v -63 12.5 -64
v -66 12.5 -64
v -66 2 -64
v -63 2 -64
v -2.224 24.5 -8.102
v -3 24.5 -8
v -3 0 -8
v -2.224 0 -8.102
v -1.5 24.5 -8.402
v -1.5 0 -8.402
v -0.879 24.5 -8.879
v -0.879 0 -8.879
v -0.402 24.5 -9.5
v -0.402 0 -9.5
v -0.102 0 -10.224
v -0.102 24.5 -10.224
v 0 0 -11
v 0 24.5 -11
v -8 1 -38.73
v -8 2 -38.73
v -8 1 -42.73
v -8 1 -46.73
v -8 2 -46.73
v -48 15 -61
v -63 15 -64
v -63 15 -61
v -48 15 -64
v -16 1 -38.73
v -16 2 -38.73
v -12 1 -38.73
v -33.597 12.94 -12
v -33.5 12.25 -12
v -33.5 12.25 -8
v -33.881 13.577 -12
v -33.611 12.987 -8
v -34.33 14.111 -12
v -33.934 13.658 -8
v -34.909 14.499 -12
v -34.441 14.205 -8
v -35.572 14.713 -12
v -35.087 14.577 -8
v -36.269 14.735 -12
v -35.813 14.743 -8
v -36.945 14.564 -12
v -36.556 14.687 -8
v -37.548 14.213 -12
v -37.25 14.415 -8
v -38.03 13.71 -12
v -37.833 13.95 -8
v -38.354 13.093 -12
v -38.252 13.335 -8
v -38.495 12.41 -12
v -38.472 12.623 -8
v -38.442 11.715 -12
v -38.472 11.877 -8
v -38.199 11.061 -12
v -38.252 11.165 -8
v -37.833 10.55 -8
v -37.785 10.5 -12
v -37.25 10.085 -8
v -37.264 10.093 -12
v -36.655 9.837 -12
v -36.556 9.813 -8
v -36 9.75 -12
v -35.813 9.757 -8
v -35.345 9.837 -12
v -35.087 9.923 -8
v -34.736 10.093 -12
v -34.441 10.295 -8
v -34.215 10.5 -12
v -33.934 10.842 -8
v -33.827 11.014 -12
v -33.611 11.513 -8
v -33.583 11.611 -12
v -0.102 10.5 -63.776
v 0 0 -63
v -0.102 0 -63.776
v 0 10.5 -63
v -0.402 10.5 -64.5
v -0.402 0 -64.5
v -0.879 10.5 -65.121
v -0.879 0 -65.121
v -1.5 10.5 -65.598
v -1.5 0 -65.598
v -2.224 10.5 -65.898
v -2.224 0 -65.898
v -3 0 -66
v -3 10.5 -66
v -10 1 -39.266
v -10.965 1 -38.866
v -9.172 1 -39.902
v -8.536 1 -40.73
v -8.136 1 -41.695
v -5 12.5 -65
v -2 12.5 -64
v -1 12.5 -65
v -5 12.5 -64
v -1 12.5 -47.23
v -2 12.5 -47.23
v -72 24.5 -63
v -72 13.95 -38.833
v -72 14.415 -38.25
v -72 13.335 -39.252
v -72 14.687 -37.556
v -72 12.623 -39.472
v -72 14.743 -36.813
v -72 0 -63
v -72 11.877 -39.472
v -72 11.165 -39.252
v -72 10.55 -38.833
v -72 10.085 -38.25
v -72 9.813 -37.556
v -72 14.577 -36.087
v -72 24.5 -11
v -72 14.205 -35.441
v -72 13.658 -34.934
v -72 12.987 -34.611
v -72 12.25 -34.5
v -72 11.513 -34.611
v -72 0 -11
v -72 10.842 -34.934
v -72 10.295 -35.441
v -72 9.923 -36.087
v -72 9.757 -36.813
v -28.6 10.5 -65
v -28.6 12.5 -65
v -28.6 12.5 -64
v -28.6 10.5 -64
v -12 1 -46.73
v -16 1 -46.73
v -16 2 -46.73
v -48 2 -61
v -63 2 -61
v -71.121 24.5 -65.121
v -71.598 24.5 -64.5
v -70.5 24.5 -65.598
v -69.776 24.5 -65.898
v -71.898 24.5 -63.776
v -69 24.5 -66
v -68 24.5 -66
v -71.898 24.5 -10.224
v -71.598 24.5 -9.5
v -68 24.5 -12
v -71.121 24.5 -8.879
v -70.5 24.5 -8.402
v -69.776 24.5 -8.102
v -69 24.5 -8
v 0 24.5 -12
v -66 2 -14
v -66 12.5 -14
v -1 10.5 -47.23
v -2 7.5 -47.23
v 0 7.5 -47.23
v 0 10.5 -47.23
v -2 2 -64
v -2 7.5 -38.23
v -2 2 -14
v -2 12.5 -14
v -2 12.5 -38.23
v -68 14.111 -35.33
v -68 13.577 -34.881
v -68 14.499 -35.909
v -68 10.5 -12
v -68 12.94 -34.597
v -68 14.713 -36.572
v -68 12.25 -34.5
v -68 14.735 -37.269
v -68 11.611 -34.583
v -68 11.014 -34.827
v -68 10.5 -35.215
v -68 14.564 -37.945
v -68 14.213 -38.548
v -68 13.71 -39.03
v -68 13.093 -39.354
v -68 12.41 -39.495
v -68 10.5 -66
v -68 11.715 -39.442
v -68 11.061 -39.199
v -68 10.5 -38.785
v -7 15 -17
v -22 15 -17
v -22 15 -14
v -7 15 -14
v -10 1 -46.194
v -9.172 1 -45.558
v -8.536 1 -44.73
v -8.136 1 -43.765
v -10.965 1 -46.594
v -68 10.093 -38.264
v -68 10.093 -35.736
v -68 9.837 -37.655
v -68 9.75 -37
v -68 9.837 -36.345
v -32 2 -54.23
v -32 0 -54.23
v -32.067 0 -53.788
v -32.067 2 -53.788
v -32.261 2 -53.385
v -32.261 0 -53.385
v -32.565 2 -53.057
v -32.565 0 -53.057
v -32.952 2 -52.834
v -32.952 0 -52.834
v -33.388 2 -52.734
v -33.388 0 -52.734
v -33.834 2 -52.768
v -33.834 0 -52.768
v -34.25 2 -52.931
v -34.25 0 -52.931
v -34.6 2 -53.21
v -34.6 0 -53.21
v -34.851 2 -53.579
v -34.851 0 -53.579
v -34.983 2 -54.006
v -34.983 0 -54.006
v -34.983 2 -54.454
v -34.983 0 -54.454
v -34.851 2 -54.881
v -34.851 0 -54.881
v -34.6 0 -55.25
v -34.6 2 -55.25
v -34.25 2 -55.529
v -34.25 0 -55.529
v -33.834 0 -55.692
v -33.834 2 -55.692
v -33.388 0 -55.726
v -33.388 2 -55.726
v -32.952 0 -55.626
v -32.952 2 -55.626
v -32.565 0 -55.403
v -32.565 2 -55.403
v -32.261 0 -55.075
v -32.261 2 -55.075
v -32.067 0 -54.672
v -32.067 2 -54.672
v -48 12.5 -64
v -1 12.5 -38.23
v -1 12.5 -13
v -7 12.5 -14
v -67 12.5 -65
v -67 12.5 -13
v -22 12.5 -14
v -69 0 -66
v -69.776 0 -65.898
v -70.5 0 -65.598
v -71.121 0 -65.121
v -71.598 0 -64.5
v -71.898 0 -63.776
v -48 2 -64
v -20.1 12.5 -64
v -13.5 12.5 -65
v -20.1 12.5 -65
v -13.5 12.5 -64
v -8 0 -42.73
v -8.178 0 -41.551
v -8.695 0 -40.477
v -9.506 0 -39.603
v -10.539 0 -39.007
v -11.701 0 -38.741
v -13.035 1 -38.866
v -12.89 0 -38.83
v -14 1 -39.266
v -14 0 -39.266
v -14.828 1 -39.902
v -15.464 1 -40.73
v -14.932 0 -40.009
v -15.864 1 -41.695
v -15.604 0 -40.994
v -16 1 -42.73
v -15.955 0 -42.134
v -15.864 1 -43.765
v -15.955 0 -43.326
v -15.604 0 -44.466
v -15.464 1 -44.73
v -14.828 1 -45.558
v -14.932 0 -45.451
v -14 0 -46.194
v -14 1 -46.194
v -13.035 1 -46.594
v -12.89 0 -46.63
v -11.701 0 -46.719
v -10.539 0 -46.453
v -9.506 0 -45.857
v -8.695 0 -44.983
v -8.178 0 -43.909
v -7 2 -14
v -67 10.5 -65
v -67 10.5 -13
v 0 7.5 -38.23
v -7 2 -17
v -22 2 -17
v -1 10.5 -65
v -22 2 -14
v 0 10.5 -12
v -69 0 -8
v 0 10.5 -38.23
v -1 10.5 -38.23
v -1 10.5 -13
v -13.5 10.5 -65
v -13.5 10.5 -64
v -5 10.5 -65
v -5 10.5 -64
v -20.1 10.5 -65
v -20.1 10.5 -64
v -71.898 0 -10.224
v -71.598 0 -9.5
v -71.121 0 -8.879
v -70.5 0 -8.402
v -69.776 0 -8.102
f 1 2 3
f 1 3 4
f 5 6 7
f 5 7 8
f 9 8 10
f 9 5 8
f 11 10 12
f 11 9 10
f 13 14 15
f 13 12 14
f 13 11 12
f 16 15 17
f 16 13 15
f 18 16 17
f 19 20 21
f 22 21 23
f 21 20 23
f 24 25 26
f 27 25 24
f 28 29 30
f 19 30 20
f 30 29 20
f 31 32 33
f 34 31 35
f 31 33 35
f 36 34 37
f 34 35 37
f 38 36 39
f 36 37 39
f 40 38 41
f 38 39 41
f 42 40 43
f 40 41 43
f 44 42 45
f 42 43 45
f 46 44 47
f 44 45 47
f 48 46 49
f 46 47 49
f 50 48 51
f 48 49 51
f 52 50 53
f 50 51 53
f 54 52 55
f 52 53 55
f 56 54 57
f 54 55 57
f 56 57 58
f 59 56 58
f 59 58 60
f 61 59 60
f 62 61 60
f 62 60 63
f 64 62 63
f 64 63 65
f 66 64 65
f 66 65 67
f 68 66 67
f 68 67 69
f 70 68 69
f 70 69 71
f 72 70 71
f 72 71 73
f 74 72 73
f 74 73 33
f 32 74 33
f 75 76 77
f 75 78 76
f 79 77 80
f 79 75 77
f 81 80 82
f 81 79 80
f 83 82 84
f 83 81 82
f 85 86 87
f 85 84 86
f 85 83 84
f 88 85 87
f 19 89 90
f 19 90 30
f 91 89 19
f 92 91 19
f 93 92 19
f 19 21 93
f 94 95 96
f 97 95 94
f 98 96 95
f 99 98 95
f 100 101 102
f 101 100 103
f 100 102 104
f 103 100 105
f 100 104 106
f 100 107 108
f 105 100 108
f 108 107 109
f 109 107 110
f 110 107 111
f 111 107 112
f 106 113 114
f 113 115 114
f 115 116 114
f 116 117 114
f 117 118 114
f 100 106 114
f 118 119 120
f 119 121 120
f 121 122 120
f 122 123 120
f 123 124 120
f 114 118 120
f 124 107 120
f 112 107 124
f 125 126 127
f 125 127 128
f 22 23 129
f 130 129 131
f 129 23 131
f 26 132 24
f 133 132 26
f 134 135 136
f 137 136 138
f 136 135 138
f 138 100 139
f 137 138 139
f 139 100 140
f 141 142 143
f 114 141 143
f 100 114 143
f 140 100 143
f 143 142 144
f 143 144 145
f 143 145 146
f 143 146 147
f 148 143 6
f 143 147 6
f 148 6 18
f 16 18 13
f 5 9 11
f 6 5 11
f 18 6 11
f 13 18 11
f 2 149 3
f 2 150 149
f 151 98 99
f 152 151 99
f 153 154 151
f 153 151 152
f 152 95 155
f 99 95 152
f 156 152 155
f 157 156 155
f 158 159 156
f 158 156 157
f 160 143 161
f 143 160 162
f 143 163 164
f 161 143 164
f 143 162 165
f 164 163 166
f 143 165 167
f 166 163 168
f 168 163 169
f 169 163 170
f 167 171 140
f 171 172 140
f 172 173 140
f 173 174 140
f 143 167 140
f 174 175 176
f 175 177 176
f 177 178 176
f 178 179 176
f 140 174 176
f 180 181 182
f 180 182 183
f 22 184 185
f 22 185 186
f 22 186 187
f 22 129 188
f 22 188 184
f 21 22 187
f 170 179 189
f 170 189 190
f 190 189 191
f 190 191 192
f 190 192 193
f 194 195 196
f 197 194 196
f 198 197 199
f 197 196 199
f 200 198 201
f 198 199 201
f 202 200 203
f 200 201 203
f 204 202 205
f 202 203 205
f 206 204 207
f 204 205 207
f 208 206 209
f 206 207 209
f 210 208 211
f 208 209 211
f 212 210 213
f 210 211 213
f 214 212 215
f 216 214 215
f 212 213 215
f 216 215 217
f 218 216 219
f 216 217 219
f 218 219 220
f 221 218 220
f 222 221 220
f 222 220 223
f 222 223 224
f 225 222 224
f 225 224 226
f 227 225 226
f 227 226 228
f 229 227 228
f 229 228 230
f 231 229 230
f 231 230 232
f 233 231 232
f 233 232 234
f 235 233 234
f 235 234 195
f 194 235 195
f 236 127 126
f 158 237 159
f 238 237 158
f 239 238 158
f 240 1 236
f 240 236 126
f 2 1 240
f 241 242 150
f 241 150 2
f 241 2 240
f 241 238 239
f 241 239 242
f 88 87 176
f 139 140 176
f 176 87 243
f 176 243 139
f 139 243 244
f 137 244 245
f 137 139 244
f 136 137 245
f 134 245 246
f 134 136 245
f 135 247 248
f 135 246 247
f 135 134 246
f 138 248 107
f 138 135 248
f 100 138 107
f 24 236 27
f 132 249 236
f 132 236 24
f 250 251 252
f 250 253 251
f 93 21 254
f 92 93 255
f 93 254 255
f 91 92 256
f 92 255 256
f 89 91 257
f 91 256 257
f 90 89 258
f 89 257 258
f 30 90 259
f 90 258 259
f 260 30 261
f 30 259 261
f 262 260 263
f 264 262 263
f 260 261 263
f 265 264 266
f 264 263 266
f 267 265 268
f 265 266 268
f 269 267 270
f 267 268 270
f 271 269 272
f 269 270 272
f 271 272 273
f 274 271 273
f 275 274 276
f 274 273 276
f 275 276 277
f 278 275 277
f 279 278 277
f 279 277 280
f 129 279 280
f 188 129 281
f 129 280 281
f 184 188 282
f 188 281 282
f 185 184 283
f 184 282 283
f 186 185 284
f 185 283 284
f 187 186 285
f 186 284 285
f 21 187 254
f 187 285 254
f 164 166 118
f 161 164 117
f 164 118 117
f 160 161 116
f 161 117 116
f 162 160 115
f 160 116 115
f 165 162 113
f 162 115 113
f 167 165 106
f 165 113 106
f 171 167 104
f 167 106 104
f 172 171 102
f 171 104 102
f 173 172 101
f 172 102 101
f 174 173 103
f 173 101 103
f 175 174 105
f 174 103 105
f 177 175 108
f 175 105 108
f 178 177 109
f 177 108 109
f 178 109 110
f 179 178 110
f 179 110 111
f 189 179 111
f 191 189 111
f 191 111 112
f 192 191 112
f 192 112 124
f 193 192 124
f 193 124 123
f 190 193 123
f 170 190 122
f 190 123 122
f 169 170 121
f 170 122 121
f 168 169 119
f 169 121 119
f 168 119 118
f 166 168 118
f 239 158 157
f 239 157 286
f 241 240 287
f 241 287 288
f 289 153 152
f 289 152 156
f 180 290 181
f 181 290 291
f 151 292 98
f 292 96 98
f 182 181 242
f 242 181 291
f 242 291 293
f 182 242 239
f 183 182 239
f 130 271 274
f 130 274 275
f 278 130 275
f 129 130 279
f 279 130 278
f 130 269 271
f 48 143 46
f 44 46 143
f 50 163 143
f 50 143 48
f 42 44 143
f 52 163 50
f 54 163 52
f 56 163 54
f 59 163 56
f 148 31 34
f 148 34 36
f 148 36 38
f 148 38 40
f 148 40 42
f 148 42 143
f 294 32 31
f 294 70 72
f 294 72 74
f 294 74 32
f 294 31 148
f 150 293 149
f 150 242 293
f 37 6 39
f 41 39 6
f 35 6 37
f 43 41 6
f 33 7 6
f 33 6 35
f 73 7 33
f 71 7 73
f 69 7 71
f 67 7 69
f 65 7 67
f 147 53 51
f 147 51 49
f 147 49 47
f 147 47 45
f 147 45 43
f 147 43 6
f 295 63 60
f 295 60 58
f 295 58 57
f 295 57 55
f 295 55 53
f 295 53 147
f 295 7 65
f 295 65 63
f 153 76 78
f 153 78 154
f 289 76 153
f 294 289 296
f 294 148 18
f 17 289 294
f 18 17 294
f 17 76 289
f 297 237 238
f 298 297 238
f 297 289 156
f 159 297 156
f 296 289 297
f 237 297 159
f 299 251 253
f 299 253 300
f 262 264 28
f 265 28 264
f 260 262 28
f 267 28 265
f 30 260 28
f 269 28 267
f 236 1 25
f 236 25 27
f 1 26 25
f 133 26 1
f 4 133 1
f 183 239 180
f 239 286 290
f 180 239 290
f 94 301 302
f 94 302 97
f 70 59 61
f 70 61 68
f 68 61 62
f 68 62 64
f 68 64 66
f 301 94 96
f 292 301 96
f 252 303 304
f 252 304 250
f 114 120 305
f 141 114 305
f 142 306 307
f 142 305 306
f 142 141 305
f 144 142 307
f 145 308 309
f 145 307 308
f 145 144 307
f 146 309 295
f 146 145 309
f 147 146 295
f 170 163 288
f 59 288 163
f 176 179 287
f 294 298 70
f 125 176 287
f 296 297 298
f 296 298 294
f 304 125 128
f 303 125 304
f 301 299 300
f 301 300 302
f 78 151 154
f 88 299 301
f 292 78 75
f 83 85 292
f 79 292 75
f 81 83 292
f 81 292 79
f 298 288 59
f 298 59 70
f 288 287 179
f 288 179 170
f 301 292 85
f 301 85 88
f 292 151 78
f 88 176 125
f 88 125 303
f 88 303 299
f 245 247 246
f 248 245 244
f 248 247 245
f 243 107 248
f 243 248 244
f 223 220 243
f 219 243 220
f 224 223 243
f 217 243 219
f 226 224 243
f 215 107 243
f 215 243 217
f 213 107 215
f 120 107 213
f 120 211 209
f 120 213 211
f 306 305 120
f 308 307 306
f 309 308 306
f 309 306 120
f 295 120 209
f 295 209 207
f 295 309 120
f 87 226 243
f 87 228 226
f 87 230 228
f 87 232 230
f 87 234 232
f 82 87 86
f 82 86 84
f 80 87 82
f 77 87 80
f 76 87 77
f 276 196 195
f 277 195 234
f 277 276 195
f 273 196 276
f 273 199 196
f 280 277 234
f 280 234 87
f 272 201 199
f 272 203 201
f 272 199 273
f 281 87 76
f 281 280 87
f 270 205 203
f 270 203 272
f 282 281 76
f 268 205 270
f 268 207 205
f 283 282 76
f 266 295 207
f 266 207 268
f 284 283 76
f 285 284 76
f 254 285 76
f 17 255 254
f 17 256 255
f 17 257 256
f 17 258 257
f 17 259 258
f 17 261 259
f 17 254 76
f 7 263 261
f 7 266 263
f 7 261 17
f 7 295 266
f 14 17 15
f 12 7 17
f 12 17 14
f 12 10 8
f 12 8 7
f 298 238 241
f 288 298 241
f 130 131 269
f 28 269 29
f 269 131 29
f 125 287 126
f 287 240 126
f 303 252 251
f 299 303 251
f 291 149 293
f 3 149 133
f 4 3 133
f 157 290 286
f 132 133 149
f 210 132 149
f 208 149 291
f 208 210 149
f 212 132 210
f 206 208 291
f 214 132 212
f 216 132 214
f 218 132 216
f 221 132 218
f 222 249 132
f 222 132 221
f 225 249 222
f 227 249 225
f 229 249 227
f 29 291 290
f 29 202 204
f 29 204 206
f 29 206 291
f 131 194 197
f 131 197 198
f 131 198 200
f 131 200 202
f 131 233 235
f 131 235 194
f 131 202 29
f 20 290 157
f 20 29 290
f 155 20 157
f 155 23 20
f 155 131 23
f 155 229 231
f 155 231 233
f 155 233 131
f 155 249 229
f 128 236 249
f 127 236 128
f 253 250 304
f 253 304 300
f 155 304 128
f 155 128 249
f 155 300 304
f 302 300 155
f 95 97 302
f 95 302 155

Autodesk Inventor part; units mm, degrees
ref_plane "YZ Plane" through (0, 0, 0) normal (1, 0, 0) x (0, 1, 0)
ref_plane "XZ Plane" through (0, 0, 0) normal (0, 1, 0) x (-1, 0, 0)
ref_plane "XY Plane" through (0, 0, 0) normal (0, 0, 1) x (1, 0, 0)
sketch "Sketch1" plane through (0, 0, 0) normal (0, 1, 0) x (-1, 0, 0)
  point P0 (0, 0)
sketch "Sketch2" plane through (0, 0, 0) normal (0, 1, 0) x (-1, 0, 0)
  line L0 (68, -12) -> (68, -66)
  line L1 (68, -66) -> (0, -66)
  line L2 (0, -66) -> (0, -12)
  line L3 (68, -12) -> (0, -12)
  point P0 (0, 0)
  dimension "d0" = 68
  dimension "d138" = 54
extrude "Extrusion1" add sketch "Sketch2" along normal blind 12.5
sketch "Sketch3" plane through (0, 12.5, 0) normal (0, 1, 0) x (1, 0, 0)
  point P0 (-68, 66)
sketch "Sketch4" plane through (0, 12.5, 0) normal (0, 1, 0) x (1, 0, 0)
  line L0 (0, 66) -> (-68, 66) projected
  line L1 (-30.4814, 66) -> (-28.4814, 66)
  line L2 (-28.4814, 66) -> (-28.4814, 64)
  line L3 (-68, 66) -> (-68, 12) projected
  line L4 (-68, 37.8423) -> (-68, 39.8423)
  line L5 (-68, 39.8423) -> (-66, 39.8423)
  line L6 (0, 38.8423) -> (0, 36.8423)
  line L7 (0, 36.8423) -> (-2, 36.8423)
  line L8 (-66, 64) -> (-2, 64)
  line L9 (-2, 64) -> (-2, 14)
  line L10 (-2, 14) -> (-66, 14)
  line L11 (-66, 14) -> (-66, 64)
  dimension "d5" = 2
  dimension "d6" = 2
  dimension "d7" = 2
  dimension "d11" = 2
  dimension "d75" = 2
  dimension "d132" = 50
  dimension "d133" = 64
extrude "Extrusion2" cut sketch "Sketch4" against normal blind 10.5 contours L8 L9 L10 L11
sketch "Sketch7" plane through (0, 12.5, 0) normal (0, 1, 0) x (1, 0, 0)
  line L0 (-68, 66) -> (-67, 66)
  line L1 (-68, 66) -> (-6, 66)
  line L2 (-68, 65) -> (-68, 66)
  line L3 (0, 66) -> (-7, 66)
  line L4 (-67, 65) -> (-1, 65)
  line L5 (0, 66) -> (-68, 66) projected
  line L6 (-68, 66) -> (0, 66)
  line L7 (0, 12) -> (0, 66) projected
  line L8 (0, 12) -> (-1, 12)
  line L9 (-1, 66) -> (0, 66)
  line L10 (0, 66) -> (0, 12)
  line L11 (0, 12) -> (-1, 12)
  line L12 (-68, 12) -> (0, 12) projected
  line L13 (-1, 65) -> (-1, 12)
  line L14 (0, 12) -> (-1, 12)
  line L15 (-67, 65) -> (-67, 12)
  line L16 (-68, 66) -> (-68, 12) projected
  line L17 (-67, 12) -> (-68, 12)
  line L18 (-68, 12) -> (-68, 66)
  dimension "d76" = 1
  dimension "d139" = 1
  dimension "d140" = 1
extrude "Extrusion3" cut sketch "Sketch7" against normal blind 2 contours L0 L1 L3 L7 L8 L13 L4 L15 L12 L16 L2
sketch "Sketch8" plane through (0, 12.5, 0) normal (0, 1, 0) x (1, 0, 0)
  line L0 (0, 12) -> (0, 13)
  line L1 (0, 13) -> (-68, 13)
  line L2 (0, 12) -> (-68, 12)
  line L3 (-68, 12) -> (-68, 13)
  line L4 (-67, 12) -> (-1, 12) projected
  point P0 (0, 0)
  point P1 (-70, 0)
  dimension "d46" = 68
  dimension "d141" = 1
extrude "Extrusion4" cut sketch "Sketch8" against normal blind 2
sketch "Sketch10" plane through (0, 2, 0) normal (0, 1, 0) x (1, 0, 0)
  line L0 (-31, 2) -> (-41, 2)
  line L1 (-63, 64) -> (-48, 64)
  line L2 (-48, 64) -> (-48, 61)
  line L3 (-48, 61) -> (-63, 61)
  line L4 (-63, 61) -> (-63, 64)
  line L5 (-22, 14) -> (-7, 14)
  line L6 (-7, 14) -> (-7, 17)
  line L7 (-7, 17) -> (-22, 17)
  line L8 (-22, 17) -> (-22, 14)
  line L9 (-66, 14) -> (-66, 64) projected
  line L10 (-2, 14) -> (-66, 14) projected
  line L11 (-66, 64) -> (-2, 64)
  line L12 (-2, 64) -> (-2, 14)
  line L13 (-2, 14) -> (-66, 14)
  line L14 (-66, 14) -> (-66, 64)
  point P0 (0, 0)
  point P1 (-21, 64)
  dimension "d57" = 15
  dimension "d58" = 3
  dimension "d61" = 15
  dimension "d79" = 3
extrude "Extrusion5" add sketch "Sketch10" along normal blind 13 contours L1 L2 L3 L4 | L8 L7 L6 L5
sketch "Sketch11" plane through (0, 0, 0) normal (0, -1, 0) x (1, 0, 0)
  circle A0 centre (-12, -42.73) radius 4
  circle A1 centre (-33.5, -54.23) radius 1.5
  line L0 (0, 0) -> (0, -66) projected
  line L1 (0, -66) -> (-68, -66) projected
  line L2 (-2, -64) -> (-2, -14) projected
  dimension "d85" = 23.27
  dimension "d86" = 21.5
  dimension "d88" = 8
  dimension "d89" = 3
  dimension "d119" = 11.5
  dimension "d120" = 10
extrude "Extrusion6" cut sketch "Sketch11" against normal blind 9
sketch "Sketch12" plane through (0, 0, 0) normal (0, -1, 0) x (1, 0, 0)
  line L0 (-68, -12) -> (-68, -66) projected
  line L1 (0, -12) -> (0, -8)
  line L2 (0, -8) -> (-68, -8)
  line L3 (-68, -12) -> (0, -12)
  line L4 (0, -12) -> (-68, -12) projected
  line L5 (-68, -66) -> (-68, -12) projected
  line L6 (-68, -66) -> (-72, -66)
  line L7 (-68, -12) -> (-68, -66)
  line L8 (-72, -66) -> (-72, -12)
  line L9 (-68, -8) -> (-72, -8)
  line L10 (-72, -8) -> (-72, -12.2471)
  point P0 (0, 0)
  point P1 (-70, 0)
  dimension "d81" = 4
  dimension "d144" = 0
extrude "Extrusion7" add sketch "Sketch12" against normal blind 24.5
sketch "Sketch15" plane through (0, 0, -66) normal (1, 0, 0) x (0, 0, -1)
  line L0 (-27.77, 12.5) -> (-18.77, 12.5)
  line L1 (-18.77, 12.5) -> (-18.77, 7.5)
  line L2 (-18.77, 7.5) -> (-27.77, 7.5)
  line L3 (-27.77, 7.5) -> (-27.77, 12.5)
  line L4 (-54, 0) -> (-54, 24.5) projected
  line L5 (0, 0) -> (0, 10.5) projected
  line L6 (0, 0) -> (-58, 0) projected
  line L7 (0, 10.5) -> (-54, 10.5) projected
  line L8 (-23.27, -7.8454) -> (-23.27, 0)
  line L9 (-23.27, 0) -> (-23.27, 10.5)
  line L10 (-53, 12.5) -> (-1, 12.5) projected
  point P0 (-66, 0)
  point P1 (-66, 14.75)
  point P2 (0, 16.75)
  point P3 (-1, 12.5)
  dimension "d108" = 9
  dimension "d109" = 5
  dimension "d111" = 27.77
  dimension "d174" = 0
extrude "Extrusion9" cut sketch "Sketch15" against normal blind 10 contours L0 L1 L7 L3 | L7 L9 L2 L3 | L1 L2 L9 L7
fillet "Fillet7" radius 3 1 edges at (0, 5.25, -66)
fillet "Fillet9" radius 3 1 edges at (0, 12.25, -8)
sketch "Sketch17" plane through (-3, 0, -66) normal (0, 0, -1) x (-1, 0, 0)
  line L0 (2, 15.5) -> (10.5, 15.5)
  line L1 (10.5, 15.5) -> (10.5, 10.5)
  line L2 (10.5, 10.5) -> (2, 10.5)
  line L3 (2, 10.5) -> (2, 15.5)
  line L4 (17.1, 15.5) -> (25.6, 15.5)
  line L5 (25.6, 15.5) -> (25.6, 10.5)
  line L6 (25.6, 10.5) -> (17.1, 10.5)
  line L7 (17.1, 10.5) -> (17.1, 15.5)
  line L8 (66, 0) -> (66, 10.5) projected
  line L9 (-2, 12.5) -> (64, 12.5) projected
  line L10 (65, 10.5) -> (0, 10.5) projected
  line L11 (-3, 10.5) -> (-3, 0) projected
  point P0 (64, 10.5)
  dimension "d151" = 8.5
  dimension "d152" = 8.5
  dimension "d153" = 5
  dimension "d157" = 0
  dimension "d158" = 13.5
  dimension "d160" = 28.6
extrude "Extrusion11" cut sketch "Sketch17" against normal blind 10 contours L0 L1 L9 L3 | L9 L1 L2 L3 | L9 L5 L6 L7 | L7 L4 L5 L9
sketch "Sketch18" plane through (0, 2, 0) normal (0, 1, 0) x (1, 0, 0)
  circle A0 centre (-12, 42.73) radius 4 projected
  line L0 (-12, 38.73) -> (-8, 38.73)
  line L1 (-8, 38.73) -> (-8, 46.73)
  line L2 (-8, 46.73) -> (-16, 46.73)
  line L3 (-16, 46.73) -> (-16, 38.73)
  line L4 (-16, 38.73) -> (-12, 38.73)
  point P0 (0, 0)
  dimension "d169" = 4
  dimension "d170" = 8
  dimension "d171" = 8
extrude "Extrusion12" cut sketch "Sketch18" against normal blind 1
sketch "Sketch19" plane through (-72, 0, -8) normal (0, 0, 1) x (1, 0, 0)
  line L0 (0, 24.5) -> (69, 24.5) projected
  line L1 (69, 0) -> (0, 0) projected
  line L2 (0, 24.5) -> (0, 0)
  line L3 (0, 0) -> (0, 24.5) projected
  line L4 (0, 12.25) -> (70, 12.25)
  line L5 (4, 10.5) -> (69, 10.5) projected
  line L6 (72, 10.5) -> (72, 0) projected
  line L7 (0, 0) -> (72, 0)
  line L8 (0, 4.6147) -> (36, 4.6147)
  line L9 (36, 4.6147) -> (36, 24.5)
  line L10 (72, 24.5) -> (4, 24.5) projected
  circle A0 centre (36, 12.25) radius 2.5
  dimension "d177" = 36
  dimension "d178" = 5
extrude "Extrusion13" cut sketch "Sketch19" against normal blind 4 contours A0 L9 L4 | L4 L9 L5 A0 | A0 L4 L9 | L4 A0 L5 L9 | L5 L9 A0 | L9 L5 A0
sketch "Sketch20" plane through (-72, 0, -66) normal (-1, 0, 0) x (0, 0, 1)
  line L0 (0, 0) -> (0, 24.5) projected
  line L1 (0, 12.25) -> (58, 12.25)
  line L2 (58, 24.5) -> (58, 0) projected
  line L3 (3, 0) -> (55, 0) projected
  line L4 (29, 0) -> (29, 24.5)
  line L5 (54, 24.5) -> (0, 24.5) projected
  circle A0 centre (29, 12.25) radius 2.5
  point P0 (66, 0)
  dimension "d181" = 5
extrude "Extrusion14" cut sketch "Sketch20" against normal blind 4 contours A0 L4 L1 | L1 L4 A0 | L4 A0 L1 | L1 A0 L4
fillet "Fillet12" radius 3 1 edges at (-72, 12.25, -8)
fillet "Fillet13" radius 3 1 edges at (-72, 12.25, -66)
properties part number "Shell 4 top"
